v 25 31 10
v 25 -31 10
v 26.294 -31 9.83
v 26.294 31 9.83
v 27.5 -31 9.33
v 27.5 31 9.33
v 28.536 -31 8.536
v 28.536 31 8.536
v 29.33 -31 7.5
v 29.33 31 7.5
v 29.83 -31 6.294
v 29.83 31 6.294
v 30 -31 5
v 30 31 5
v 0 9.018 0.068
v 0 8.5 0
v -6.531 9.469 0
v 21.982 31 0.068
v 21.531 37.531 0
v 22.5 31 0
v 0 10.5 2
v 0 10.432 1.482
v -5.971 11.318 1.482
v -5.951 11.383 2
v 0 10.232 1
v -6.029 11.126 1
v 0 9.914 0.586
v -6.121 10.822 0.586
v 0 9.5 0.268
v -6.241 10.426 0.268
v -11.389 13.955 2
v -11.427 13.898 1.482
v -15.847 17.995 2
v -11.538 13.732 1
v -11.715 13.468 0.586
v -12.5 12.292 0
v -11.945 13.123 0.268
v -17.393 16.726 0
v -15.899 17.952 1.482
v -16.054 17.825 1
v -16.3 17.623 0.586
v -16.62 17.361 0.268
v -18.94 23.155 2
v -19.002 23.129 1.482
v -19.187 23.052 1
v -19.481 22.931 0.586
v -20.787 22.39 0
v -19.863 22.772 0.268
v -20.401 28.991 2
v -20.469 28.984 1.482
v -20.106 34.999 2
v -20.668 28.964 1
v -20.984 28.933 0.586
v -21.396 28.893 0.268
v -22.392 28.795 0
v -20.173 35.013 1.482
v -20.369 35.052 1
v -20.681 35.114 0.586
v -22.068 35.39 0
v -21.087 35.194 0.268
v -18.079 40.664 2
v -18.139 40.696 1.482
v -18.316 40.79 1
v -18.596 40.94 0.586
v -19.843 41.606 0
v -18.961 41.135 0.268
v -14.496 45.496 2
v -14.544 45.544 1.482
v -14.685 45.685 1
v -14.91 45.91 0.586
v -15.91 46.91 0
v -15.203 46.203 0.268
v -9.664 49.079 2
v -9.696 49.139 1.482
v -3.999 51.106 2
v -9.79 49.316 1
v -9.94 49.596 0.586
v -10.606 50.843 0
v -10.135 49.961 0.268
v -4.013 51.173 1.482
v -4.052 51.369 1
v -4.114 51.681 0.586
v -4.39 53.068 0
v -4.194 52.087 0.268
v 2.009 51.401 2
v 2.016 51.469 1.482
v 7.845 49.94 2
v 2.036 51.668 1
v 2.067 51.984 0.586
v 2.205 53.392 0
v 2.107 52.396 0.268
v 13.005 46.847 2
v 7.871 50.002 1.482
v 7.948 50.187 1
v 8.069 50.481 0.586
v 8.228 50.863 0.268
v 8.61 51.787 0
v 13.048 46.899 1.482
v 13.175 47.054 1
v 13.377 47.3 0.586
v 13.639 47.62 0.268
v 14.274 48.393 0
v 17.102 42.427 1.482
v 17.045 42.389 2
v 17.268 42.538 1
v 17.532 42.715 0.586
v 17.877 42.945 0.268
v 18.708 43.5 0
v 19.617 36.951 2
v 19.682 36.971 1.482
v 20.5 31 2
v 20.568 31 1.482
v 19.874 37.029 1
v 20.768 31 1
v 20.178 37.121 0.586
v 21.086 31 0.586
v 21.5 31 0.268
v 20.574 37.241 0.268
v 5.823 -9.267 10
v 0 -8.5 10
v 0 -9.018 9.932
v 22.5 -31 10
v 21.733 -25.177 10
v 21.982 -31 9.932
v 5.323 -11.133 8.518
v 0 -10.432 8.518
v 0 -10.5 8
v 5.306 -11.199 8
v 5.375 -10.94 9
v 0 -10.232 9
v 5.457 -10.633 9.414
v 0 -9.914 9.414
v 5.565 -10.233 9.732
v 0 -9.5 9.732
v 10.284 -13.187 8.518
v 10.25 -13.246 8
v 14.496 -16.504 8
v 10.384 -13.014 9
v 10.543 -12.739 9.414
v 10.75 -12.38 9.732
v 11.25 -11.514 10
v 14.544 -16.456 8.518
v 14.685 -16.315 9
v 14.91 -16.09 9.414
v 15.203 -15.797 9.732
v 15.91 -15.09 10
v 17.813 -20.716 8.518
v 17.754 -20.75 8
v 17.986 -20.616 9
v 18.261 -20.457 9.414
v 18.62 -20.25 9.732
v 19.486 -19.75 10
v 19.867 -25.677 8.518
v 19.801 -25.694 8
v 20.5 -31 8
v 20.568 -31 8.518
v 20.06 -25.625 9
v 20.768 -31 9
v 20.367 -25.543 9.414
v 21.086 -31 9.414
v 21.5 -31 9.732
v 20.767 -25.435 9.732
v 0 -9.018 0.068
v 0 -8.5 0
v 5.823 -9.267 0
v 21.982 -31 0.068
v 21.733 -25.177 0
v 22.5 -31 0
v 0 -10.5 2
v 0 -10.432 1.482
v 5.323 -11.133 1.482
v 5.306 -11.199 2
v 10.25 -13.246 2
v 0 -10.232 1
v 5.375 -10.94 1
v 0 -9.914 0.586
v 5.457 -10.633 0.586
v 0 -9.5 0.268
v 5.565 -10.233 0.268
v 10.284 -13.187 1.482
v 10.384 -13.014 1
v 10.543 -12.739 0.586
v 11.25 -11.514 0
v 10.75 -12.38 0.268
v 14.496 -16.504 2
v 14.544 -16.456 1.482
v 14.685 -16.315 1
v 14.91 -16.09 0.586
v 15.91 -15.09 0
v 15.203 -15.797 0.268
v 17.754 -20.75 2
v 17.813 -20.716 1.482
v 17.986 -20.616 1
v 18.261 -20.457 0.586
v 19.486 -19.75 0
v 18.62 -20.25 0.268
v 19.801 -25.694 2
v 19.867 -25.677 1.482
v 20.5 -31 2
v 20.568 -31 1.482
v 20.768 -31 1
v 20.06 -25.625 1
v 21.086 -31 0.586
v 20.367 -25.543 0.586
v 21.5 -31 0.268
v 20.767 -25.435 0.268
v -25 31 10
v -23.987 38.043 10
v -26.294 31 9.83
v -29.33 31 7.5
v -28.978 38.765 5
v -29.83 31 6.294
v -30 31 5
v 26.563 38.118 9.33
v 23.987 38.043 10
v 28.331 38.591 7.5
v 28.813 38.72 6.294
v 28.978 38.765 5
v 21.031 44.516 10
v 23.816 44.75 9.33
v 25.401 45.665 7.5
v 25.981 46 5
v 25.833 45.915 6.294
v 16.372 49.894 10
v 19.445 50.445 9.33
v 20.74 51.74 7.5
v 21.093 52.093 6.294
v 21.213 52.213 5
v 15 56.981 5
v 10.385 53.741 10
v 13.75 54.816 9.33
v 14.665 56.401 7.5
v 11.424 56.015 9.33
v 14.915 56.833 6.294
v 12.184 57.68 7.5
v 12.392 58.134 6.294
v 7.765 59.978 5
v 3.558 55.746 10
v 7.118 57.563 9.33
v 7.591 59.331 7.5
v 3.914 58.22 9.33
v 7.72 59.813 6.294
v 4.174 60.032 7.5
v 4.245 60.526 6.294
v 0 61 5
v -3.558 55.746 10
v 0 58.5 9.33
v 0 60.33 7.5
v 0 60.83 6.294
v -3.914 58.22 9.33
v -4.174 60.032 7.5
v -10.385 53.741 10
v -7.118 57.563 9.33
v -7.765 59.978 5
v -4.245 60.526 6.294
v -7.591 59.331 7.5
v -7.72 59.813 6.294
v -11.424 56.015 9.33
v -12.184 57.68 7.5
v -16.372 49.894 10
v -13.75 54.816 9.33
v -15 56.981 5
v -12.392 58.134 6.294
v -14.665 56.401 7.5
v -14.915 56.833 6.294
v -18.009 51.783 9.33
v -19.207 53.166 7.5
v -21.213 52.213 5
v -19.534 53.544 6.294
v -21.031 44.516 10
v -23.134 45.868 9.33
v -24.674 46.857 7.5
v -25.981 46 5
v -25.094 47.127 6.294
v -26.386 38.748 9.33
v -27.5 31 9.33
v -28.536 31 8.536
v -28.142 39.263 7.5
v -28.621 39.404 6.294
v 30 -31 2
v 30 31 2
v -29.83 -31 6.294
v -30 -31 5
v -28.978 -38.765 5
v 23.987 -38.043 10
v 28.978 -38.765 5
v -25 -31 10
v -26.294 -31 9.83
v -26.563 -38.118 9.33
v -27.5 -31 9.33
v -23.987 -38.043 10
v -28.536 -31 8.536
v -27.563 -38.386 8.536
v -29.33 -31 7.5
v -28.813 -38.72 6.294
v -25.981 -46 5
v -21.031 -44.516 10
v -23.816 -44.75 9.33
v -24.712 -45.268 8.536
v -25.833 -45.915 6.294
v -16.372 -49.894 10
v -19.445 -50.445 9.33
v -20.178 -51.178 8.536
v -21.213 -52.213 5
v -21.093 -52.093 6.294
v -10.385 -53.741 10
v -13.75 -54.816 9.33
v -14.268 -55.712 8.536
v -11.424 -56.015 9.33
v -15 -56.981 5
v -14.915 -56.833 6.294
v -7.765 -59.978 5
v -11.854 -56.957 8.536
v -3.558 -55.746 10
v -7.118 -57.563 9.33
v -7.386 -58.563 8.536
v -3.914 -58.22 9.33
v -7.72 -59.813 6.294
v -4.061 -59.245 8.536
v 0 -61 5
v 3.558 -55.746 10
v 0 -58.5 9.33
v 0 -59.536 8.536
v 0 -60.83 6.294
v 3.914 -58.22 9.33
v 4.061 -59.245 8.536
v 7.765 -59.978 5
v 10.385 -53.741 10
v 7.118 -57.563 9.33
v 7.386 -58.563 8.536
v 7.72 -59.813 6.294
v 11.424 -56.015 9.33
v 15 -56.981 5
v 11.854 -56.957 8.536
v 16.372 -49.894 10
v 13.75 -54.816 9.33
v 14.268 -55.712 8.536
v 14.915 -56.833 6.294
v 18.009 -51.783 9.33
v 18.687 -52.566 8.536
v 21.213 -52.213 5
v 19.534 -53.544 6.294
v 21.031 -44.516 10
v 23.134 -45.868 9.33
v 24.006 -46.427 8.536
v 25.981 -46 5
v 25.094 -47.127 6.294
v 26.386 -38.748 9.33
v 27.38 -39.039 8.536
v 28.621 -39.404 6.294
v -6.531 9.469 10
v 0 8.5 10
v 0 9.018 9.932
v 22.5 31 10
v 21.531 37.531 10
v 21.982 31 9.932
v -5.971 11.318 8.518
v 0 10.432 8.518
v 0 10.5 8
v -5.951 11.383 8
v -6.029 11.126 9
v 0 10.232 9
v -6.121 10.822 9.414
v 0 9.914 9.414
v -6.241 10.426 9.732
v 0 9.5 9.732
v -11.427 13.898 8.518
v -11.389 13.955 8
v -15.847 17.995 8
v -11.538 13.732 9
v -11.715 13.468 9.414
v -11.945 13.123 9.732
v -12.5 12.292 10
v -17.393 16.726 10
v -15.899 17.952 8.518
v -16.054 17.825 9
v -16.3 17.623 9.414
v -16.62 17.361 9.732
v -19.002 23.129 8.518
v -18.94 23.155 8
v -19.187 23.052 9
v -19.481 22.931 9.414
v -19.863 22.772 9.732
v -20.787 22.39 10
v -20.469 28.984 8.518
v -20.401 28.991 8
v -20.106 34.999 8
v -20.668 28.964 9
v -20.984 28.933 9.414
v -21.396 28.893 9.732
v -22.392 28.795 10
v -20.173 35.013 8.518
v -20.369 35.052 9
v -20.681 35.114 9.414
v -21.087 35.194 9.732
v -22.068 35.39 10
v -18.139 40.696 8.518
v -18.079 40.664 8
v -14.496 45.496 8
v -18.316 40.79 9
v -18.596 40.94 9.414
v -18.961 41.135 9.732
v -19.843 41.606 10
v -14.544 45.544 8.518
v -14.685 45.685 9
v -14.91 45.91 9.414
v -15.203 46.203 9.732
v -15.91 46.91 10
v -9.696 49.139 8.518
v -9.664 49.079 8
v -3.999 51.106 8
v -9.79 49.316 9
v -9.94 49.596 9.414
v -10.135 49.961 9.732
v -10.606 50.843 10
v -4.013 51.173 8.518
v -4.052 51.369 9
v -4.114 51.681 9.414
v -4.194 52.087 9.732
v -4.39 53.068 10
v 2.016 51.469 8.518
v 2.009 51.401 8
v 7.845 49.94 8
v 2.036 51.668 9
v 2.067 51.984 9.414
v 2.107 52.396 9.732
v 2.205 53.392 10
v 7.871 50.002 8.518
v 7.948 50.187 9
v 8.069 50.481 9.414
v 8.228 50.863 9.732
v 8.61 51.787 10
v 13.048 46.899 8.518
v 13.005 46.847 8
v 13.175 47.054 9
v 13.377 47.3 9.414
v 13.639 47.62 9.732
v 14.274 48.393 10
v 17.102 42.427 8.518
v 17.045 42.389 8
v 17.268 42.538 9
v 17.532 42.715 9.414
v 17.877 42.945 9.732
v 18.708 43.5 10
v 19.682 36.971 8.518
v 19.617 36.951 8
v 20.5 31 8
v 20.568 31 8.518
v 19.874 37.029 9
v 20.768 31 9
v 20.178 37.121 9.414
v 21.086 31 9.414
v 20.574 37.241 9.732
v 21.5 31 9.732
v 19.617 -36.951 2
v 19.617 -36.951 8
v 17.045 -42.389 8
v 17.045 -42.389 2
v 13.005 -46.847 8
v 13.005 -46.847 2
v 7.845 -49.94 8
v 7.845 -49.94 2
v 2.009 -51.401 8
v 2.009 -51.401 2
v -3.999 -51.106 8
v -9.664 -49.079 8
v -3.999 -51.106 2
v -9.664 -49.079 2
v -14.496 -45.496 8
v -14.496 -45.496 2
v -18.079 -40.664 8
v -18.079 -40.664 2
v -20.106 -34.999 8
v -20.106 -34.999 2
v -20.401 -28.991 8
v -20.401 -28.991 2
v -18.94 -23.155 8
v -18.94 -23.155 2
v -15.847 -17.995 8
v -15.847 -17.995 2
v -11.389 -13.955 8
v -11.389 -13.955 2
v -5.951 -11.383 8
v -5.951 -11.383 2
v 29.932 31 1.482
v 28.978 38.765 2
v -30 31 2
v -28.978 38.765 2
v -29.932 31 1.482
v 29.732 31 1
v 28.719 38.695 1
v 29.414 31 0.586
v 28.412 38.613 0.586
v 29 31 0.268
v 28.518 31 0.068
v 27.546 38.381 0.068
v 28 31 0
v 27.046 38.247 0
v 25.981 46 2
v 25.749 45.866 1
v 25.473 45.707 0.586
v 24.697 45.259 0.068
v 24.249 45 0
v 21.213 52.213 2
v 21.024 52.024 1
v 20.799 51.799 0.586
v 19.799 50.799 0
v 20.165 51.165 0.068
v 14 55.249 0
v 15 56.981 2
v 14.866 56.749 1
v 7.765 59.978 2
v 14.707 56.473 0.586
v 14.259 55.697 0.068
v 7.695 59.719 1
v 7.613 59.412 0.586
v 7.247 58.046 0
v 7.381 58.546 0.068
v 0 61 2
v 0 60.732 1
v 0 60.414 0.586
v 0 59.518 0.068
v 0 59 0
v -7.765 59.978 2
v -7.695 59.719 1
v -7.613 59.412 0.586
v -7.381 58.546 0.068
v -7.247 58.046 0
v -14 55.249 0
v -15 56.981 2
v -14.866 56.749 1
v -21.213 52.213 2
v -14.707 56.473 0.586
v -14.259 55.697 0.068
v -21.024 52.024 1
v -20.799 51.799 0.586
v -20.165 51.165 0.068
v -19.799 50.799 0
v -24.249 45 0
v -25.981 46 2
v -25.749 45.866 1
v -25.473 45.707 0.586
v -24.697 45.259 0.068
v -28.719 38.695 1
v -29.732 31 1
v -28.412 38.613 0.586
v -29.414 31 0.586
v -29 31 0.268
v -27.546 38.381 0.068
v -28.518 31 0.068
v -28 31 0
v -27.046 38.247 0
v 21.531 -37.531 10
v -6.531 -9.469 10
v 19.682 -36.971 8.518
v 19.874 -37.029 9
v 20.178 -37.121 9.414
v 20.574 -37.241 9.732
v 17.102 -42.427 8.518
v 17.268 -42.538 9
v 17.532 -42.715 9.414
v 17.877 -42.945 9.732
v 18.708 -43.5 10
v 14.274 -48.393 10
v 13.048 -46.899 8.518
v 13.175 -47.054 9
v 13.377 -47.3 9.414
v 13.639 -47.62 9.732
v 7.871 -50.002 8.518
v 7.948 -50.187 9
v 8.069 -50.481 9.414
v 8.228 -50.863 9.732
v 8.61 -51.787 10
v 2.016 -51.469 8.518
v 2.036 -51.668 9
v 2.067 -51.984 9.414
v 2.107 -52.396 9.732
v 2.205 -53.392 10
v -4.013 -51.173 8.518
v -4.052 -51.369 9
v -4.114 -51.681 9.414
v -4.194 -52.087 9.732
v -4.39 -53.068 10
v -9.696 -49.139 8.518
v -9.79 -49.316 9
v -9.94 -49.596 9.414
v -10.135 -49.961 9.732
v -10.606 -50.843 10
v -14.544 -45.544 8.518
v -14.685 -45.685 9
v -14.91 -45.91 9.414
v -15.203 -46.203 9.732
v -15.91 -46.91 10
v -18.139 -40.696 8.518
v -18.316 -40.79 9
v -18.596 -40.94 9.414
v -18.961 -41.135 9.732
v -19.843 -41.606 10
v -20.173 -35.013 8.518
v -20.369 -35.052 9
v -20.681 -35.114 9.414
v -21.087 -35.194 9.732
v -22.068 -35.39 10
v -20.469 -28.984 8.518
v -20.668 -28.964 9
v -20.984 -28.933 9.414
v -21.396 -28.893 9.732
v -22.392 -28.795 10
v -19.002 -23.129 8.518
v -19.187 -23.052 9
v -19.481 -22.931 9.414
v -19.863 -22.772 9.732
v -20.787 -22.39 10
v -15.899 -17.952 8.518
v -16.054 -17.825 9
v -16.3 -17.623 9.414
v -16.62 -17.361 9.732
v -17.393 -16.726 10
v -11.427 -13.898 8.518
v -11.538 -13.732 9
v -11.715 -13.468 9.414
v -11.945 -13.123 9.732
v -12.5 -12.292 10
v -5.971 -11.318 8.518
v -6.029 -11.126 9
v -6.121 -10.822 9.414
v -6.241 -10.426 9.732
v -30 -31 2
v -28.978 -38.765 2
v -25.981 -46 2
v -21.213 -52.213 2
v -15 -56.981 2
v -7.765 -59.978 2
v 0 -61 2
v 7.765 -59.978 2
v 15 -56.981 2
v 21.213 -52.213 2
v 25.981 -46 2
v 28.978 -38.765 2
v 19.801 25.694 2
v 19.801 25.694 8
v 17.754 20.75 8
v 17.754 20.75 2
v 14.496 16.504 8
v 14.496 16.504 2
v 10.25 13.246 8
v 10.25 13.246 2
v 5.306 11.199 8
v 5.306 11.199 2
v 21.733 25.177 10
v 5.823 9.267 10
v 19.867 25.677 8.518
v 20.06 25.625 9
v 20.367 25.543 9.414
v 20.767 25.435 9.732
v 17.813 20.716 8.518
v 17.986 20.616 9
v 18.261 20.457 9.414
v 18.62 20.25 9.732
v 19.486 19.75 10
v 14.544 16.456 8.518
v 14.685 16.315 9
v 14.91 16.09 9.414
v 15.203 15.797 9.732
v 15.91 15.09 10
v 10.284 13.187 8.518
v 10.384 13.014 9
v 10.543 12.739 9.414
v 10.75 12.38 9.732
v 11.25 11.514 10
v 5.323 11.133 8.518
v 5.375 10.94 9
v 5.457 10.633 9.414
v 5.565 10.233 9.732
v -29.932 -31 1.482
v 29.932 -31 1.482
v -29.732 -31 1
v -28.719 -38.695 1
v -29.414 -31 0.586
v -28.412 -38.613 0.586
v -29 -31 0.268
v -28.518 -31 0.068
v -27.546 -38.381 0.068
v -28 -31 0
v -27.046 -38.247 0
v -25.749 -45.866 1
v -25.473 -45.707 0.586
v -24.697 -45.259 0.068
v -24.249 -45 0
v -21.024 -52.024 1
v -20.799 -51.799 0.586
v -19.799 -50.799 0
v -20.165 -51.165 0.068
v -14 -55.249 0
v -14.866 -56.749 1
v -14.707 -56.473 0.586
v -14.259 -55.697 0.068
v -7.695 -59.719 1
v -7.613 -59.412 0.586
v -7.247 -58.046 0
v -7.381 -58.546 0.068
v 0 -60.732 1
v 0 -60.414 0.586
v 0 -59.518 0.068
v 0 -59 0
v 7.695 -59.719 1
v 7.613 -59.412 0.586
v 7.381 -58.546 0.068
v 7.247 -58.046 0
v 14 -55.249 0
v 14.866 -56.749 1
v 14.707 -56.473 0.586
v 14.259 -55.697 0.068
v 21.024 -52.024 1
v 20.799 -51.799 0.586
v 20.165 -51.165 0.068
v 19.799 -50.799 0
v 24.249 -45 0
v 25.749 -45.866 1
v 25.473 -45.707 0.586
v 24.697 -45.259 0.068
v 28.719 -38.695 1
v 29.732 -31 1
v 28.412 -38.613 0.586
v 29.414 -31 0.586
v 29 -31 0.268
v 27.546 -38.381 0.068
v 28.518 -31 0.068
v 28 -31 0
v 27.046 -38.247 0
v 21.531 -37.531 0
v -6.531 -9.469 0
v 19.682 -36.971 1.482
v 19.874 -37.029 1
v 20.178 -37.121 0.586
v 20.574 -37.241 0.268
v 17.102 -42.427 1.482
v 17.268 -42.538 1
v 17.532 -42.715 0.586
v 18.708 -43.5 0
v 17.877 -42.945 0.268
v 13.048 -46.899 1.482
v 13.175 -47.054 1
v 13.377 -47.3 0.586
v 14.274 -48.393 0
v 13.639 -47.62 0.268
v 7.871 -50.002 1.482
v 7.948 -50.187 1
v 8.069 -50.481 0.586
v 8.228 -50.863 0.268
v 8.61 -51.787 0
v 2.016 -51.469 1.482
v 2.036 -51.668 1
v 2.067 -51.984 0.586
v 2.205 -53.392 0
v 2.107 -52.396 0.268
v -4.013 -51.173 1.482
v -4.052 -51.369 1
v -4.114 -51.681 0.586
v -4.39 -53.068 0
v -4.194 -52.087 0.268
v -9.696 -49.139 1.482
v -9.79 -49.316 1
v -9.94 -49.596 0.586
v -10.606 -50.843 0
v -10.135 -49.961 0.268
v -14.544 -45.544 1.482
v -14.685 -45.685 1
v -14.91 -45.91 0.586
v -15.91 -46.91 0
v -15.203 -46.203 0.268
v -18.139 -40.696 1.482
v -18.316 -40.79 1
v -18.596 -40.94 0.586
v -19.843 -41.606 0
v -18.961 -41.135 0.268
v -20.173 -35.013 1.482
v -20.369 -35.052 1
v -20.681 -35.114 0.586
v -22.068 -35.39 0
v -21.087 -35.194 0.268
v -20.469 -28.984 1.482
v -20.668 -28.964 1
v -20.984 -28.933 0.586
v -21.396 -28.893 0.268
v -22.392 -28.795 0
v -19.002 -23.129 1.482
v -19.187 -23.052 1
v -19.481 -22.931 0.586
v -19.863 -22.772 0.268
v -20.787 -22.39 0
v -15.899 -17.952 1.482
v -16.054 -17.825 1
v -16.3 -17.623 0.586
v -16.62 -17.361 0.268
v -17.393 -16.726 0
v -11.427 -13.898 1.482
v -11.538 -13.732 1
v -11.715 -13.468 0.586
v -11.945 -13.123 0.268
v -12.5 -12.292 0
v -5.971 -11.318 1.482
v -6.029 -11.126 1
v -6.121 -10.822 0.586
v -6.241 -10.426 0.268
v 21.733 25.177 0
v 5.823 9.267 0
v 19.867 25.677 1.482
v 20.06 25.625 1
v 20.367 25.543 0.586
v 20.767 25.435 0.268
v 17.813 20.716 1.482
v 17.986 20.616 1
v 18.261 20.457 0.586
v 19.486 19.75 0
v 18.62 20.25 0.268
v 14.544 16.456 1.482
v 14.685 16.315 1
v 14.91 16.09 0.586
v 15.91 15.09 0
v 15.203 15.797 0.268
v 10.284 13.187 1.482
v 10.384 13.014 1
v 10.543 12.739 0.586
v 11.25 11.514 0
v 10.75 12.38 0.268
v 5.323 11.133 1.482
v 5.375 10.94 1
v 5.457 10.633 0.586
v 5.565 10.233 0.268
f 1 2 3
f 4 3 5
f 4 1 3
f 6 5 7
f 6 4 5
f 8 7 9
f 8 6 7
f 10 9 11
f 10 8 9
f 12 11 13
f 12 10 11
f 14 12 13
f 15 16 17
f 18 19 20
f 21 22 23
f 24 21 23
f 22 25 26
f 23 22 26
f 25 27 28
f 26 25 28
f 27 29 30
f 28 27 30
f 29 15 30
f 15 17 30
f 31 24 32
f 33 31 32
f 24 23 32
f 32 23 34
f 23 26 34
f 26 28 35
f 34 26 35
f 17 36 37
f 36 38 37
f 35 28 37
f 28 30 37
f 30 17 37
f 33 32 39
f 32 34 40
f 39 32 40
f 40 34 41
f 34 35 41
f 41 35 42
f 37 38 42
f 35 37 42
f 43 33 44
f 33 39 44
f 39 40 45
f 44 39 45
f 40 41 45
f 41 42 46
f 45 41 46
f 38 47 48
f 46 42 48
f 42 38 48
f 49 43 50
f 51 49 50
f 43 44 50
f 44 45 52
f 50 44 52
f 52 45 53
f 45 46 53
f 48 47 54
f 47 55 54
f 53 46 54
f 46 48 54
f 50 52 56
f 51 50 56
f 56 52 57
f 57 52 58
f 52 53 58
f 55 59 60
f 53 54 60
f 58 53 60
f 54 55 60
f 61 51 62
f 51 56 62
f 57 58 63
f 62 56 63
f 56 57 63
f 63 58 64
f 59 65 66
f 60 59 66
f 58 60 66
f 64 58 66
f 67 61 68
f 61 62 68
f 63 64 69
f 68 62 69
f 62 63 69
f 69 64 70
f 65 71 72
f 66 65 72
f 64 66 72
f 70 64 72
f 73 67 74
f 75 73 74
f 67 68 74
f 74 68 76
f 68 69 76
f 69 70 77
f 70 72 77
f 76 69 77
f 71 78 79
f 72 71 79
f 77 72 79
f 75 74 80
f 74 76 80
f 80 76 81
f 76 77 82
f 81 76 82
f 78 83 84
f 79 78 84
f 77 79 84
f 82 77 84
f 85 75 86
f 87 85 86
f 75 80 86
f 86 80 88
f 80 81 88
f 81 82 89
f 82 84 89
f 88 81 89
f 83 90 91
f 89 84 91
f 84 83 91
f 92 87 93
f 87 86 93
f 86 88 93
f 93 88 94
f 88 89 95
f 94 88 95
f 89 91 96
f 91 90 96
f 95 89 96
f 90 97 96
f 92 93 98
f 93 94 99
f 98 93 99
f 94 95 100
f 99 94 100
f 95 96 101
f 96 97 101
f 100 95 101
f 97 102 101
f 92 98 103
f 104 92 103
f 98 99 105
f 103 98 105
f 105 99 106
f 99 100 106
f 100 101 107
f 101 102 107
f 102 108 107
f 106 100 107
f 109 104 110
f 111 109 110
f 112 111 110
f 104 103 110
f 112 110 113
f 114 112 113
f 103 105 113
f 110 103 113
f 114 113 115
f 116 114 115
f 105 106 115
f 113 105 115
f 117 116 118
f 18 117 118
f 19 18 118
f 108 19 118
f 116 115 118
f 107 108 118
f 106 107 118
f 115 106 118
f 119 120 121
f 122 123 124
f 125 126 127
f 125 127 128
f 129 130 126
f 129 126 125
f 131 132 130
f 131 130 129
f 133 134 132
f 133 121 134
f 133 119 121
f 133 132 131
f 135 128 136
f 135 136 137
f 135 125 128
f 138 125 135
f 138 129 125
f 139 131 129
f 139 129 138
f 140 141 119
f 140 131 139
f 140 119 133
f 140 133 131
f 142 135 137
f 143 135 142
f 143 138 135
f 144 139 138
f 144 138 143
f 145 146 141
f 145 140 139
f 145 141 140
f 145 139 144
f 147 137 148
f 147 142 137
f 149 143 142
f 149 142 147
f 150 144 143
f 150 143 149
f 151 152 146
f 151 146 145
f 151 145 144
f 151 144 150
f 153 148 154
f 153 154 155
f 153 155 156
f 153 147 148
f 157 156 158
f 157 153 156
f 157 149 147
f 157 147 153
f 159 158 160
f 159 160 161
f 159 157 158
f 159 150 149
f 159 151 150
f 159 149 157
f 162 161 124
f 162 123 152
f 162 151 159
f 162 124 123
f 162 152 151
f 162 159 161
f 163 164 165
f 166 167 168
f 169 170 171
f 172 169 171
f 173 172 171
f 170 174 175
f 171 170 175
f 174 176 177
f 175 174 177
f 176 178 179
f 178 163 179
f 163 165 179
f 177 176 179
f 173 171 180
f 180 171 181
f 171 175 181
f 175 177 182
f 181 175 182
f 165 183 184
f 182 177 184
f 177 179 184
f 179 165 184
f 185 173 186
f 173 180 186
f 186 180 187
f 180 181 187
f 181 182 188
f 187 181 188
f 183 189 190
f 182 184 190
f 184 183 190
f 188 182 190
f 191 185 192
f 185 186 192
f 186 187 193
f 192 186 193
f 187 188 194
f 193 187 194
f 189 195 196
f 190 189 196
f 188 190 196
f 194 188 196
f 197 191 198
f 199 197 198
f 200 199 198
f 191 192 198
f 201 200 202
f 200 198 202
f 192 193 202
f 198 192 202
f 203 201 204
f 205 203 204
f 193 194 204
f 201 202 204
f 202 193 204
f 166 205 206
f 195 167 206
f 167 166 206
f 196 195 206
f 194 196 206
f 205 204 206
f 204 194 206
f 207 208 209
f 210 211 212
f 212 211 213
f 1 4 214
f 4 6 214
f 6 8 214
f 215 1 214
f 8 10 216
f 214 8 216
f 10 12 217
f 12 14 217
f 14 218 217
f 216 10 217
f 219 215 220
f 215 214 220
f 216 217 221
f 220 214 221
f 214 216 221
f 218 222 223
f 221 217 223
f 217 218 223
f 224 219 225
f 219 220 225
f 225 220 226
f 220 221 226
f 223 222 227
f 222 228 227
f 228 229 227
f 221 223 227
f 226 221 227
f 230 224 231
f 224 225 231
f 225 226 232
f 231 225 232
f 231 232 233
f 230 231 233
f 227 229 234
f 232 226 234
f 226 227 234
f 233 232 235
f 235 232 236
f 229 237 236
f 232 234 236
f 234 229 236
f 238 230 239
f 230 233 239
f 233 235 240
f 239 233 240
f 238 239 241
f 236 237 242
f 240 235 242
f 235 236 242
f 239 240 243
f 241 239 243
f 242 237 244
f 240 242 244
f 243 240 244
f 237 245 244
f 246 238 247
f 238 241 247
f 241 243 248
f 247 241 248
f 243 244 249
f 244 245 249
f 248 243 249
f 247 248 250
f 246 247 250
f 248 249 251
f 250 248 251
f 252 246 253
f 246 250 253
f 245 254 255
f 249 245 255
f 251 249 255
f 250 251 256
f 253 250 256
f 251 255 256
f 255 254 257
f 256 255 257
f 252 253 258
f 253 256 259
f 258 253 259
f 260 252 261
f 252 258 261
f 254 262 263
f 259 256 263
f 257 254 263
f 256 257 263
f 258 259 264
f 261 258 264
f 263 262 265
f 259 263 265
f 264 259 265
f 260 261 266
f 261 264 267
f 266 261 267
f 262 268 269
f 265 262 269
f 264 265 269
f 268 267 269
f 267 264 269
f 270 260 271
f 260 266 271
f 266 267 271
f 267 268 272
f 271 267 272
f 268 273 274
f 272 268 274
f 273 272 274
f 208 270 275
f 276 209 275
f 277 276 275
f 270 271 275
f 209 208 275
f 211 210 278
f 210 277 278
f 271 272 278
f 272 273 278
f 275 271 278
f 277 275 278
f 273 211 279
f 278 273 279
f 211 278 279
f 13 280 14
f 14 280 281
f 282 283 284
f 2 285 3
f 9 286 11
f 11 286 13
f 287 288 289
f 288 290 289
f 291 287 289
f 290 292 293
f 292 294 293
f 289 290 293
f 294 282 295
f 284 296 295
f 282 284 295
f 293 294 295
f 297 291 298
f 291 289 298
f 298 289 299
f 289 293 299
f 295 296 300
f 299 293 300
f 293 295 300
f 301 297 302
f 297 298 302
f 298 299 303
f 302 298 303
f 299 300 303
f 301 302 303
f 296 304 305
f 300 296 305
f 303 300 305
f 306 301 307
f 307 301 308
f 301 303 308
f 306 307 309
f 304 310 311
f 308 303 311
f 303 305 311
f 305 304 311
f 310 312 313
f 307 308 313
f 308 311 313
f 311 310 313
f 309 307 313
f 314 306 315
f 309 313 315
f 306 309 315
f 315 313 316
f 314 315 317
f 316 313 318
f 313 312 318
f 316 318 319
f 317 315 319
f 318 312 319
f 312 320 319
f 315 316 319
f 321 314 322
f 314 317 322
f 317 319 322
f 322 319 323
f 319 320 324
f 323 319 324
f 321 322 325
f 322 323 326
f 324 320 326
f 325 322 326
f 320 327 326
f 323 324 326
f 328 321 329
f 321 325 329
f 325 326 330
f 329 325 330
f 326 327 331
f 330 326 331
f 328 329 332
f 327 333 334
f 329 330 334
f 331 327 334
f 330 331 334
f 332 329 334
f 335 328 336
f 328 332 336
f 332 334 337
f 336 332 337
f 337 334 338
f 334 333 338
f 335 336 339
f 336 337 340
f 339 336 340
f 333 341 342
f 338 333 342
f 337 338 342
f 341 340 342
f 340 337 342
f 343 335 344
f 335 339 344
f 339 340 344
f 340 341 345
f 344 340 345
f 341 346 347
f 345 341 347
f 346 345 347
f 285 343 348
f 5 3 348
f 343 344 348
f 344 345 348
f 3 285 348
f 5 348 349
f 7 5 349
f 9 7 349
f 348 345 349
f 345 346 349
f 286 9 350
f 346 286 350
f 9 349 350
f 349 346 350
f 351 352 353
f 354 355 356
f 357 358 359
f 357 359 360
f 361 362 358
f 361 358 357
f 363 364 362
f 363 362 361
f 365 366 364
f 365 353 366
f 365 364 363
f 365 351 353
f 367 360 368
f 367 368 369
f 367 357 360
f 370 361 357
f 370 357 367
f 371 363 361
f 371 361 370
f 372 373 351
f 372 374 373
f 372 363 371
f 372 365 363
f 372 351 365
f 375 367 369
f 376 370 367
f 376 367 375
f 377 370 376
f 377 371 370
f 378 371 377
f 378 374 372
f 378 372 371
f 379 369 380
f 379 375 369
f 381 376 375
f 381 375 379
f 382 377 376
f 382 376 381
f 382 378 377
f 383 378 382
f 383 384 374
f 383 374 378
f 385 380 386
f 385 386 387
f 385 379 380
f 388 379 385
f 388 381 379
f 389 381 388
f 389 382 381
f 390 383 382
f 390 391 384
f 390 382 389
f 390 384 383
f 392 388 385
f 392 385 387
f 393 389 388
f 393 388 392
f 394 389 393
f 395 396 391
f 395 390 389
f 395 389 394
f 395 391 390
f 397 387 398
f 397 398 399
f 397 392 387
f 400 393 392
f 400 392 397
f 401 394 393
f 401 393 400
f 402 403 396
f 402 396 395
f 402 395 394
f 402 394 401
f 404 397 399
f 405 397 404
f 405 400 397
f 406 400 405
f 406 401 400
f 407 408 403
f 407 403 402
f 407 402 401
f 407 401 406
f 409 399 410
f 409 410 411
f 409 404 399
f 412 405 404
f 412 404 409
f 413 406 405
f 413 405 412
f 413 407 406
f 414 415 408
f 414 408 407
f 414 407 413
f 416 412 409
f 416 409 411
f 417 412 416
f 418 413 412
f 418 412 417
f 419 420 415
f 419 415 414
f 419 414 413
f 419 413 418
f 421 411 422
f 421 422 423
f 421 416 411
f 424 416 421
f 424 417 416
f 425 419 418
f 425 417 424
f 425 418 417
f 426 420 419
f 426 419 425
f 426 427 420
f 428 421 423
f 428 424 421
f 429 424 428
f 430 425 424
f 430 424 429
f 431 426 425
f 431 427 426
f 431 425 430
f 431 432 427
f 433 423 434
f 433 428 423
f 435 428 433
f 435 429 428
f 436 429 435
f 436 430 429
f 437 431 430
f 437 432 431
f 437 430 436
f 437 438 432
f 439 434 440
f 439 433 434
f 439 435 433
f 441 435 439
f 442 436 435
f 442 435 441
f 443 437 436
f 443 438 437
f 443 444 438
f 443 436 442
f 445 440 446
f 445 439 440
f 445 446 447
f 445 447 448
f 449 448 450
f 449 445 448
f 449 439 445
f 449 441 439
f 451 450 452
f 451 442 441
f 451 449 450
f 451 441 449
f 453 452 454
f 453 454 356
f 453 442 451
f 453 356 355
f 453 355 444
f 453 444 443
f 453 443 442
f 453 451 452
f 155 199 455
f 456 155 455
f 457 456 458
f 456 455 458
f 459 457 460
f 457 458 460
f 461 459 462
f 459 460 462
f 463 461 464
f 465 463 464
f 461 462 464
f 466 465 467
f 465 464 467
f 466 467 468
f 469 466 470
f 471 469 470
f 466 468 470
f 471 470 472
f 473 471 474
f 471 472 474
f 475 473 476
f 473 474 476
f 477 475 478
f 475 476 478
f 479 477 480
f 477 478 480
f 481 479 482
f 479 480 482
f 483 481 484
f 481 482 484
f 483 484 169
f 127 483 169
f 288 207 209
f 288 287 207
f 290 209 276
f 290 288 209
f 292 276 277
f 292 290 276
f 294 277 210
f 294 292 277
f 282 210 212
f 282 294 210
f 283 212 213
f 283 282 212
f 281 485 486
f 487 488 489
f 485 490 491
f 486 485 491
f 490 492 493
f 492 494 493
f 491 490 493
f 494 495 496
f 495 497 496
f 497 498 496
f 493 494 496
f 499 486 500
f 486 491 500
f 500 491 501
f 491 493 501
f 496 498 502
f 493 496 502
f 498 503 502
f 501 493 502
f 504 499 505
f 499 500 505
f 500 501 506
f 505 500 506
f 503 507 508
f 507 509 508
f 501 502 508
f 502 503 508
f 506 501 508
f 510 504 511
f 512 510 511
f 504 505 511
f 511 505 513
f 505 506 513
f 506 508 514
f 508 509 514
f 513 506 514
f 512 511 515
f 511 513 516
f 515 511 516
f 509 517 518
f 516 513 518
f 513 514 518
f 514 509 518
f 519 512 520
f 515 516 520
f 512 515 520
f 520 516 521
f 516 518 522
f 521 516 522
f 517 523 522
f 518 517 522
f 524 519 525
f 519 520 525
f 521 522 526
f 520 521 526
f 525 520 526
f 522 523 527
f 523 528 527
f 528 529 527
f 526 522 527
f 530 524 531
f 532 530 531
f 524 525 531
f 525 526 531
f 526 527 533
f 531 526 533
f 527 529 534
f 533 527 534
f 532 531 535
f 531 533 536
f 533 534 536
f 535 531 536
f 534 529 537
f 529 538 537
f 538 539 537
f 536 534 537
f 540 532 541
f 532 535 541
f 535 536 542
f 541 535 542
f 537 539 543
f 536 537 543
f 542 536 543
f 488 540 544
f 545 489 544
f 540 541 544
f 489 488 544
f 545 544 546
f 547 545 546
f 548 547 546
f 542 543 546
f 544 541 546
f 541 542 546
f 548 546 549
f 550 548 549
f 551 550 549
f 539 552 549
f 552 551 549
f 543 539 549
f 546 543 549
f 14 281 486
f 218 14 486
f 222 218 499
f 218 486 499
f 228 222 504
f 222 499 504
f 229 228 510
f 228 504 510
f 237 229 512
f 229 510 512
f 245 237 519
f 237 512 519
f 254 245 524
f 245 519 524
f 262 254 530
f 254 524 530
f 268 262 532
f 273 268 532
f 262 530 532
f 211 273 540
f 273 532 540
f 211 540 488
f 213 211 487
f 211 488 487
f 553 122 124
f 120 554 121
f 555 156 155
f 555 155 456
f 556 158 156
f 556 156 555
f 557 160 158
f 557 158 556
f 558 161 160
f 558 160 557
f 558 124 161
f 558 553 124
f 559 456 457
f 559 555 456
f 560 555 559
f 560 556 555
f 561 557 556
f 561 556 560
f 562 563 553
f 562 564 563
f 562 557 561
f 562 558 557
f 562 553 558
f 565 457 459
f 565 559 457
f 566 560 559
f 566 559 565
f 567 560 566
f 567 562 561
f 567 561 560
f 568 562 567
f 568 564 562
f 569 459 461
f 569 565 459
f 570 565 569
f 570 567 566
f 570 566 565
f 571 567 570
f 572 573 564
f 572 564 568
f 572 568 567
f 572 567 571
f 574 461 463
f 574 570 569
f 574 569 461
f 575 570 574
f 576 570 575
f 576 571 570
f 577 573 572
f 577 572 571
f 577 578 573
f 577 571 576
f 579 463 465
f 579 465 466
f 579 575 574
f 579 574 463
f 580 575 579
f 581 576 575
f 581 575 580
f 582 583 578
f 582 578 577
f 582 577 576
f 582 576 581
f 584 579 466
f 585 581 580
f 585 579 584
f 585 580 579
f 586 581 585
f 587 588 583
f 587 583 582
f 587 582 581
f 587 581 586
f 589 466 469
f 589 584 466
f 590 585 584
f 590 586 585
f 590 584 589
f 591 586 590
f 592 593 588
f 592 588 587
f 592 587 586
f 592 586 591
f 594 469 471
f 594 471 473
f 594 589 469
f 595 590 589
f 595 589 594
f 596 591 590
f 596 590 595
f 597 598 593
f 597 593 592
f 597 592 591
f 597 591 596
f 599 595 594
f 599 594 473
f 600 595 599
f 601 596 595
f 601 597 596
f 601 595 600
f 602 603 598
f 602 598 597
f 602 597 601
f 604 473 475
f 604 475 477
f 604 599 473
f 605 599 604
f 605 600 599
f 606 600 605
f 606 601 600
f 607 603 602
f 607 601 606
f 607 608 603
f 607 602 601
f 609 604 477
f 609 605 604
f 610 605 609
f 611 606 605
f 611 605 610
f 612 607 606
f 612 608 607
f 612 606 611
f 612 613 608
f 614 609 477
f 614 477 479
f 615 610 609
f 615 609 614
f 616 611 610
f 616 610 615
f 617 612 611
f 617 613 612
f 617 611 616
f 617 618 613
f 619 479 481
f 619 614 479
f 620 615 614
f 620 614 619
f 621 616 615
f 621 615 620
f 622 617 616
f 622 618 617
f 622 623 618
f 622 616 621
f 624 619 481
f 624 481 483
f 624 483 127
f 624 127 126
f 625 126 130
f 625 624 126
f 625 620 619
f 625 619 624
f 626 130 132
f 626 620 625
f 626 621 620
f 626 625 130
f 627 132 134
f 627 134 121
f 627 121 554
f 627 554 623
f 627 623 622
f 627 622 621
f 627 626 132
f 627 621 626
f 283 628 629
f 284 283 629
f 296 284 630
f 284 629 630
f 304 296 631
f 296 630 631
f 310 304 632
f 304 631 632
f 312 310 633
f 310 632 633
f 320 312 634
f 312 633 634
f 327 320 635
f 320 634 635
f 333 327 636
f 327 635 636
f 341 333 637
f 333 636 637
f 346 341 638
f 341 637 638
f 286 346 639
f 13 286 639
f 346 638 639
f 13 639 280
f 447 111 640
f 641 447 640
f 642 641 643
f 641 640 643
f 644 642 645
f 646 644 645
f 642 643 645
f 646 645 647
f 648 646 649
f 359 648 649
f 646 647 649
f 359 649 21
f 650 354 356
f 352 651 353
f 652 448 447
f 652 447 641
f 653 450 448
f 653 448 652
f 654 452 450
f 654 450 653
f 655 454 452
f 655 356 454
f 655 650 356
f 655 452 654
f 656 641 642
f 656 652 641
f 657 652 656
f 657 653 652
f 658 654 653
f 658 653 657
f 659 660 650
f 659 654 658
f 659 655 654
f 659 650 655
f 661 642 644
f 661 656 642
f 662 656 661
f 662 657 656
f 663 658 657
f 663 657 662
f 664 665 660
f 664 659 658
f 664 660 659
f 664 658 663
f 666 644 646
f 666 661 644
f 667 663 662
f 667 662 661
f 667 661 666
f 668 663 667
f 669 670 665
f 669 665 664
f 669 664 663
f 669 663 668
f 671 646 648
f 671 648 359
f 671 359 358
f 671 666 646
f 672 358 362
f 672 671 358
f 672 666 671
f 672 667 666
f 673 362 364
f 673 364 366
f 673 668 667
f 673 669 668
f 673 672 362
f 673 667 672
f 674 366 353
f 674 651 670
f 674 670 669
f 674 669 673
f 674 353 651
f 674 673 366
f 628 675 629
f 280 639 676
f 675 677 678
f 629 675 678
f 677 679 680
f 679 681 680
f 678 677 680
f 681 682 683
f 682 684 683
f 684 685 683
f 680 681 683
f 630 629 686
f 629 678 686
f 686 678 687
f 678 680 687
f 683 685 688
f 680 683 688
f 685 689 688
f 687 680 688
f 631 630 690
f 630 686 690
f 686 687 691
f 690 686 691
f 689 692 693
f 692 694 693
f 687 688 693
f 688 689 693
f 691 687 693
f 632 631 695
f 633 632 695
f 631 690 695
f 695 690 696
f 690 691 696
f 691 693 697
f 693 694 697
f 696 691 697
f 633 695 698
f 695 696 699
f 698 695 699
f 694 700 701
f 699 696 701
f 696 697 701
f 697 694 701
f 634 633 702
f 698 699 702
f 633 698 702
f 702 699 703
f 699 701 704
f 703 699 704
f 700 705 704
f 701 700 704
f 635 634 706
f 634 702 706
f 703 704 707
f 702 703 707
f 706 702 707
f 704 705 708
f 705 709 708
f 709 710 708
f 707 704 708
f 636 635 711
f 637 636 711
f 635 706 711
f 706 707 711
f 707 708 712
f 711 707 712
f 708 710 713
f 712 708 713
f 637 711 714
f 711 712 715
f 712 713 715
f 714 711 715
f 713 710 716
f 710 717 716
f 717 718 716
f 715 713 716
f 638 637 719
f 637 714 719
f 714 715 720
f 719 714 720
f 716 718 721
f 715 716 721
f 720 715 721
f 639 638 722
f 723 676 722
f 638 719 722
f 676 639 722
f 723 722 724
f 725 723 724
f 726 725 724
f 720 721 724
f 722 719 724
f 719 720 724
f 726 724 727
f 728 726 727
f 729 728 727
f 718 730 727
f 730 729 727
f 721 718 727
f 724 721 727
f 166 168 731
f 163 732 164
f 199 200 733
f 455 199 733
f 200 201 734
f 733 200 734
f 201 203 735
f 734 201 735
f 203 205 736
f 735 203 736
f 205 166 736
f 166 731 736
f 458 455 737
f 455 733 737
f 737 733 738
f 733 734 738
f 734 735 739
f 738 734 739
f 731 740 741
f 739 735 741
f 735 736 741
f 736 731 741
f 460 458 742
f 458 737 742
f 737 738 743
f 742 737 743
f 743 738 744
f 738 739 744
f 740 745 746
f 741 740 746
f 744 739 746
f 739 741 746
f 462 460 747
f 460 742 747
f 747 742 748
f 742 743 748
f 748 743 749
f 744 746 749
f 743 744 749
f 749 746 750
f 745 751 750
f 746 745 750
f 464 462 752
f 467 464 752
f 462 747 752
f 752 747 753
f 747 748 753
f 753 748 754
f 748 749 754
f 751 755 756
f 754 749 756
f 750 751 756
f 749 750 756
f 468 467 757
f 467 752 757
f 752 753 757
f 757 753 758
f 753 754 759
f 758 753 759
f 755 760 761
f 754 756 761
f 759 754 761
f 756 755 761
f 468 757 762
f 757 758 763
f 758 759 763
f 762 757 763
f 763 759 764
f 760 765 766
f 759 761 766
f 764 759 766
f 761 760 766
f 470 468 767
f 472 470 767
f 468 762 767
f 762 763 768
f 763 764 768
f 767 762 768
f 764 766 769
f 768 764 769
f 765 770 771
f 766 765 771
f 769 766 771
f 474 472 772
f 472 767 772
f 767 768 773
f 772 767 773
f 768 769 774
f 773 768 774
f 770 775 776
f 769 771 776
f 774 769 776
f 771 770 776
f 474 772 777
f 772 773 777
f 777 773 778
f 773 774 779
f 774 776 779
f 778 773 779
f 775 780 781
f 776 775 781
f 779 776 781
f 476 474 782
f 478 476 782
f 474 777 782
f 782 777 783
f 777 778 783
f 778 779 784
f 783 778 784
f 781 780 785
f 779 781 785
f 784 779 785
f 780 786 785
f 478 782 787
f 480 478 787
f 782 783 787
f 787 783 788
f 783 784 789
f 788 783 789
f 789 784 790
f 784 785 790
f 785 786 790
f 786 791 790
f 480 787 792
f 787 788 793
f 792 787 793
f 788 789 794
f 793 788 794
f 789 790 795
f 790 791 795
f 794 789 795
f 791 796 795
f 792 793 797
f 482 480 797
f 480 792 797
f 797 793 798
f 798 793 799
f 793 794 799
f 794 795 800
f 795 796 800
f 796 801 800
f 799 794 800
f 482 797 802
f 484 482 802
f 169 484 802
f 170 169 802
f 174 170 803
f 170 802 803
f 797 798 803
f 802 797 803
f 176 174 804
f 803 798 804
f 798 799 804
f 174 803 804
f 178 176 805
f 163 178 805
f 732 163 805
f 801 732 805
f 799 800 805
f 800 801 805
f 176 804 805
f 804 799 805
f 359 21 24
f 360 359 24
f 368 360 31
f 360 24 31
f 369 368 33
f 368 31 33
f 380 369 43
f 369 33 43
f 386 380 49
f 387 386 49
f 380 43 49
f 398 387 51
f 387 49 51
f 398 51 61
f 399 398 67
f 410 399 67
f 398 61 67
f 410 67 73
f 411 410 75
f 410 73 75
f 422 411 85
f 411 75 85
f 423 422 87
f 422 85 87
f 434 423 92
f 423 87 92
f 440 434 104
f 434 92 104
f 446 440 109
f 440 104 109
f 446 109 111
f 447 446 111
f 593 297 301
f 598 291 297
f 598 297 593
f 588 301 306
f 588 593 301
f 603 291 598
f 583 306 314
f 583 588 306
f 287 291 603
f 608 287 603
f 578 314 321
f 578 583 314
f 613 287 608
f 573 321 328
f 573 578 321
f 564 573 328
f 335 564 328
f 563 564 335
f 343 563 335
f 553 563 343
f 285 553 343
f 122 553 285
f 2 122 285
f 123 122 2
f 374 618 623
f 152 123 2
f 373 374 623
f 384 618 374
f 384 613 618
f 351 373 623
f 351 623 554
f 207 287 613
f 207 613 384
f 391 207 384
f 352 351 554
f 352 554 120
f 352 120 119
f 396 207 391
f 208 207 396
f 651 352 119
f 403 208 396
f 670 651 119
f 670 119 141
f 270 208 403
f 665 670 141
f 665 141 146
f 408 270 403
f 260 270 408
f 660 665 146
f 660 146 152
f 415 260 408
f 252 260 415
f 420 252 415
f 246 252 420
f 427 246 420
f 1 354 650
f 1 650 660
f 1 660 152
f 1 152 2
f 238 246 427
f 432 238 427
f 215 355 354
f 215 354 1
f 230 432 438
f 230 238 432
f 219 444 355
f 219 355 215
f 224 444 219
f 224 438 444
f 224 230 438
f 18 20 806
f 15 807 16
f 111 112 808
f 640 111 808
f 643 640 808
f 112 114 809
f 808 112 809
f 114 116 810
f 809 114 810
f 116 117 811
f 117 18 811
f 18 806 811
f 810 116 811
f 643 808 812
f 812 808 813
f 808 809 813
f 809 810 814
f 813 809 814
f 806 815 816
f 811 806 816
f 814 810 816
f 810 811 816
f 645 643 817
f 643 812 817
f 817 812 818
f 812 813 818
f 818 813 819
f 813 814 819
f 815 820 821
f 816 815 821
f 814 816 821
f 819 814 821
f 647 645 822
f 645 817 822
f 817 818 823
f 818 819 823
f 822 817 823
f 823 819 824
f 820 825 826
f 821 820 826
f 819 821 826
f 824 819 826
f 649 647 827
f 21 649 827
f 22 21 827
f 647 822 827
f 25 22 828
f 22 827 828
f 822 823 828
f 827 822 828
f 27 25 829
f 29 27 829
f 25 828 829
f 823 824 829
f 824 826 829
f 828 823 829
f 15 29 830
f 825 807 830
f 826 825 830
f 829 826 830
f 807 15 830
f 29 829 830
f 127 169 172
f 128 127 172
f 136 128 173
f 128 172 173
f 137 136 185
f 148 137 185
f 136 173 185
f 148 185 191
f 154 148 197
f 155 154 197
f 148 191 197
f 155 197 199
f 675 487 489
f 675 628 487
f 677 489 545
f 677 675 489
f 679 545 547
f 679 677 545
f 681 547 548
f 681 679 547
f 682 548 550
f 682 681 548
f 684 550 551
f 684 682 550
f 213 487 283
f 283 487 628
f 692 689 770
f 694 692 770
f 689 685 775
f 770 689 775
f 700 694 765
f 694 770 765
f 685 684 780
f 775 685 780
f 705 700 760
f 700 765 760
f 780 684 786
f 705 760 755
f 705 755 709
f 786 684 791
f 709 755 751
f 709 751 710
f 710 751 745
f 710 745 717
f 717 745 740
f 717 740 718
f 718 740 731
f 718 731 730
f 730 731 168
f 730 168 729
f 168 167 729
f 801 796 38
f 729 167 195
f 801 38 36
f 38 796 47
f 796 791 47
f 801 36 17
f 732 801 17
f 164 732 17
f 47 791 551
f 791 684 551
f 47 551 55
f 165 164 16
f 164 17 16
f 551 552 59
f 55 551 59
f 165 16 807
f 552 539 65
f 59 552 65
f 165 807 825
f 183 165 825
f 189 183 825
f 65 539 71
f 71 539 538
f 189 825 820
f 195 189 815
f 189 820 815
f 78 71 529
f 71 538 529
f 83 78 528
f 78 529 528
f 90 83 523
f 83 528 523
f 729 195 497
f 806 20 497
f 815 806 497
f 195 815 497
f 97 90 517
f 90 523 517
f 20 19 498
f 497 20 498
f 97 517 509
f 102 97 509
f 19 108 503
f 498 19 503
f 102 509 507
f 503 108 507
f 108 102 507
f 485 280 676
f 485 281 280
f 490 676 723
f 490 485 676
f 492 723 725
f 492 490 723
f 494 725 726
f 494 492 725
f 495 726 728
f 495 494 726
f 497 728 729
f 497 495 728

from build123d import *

# Parameters (mm, degrees)
F1_DEPTH = 10
F2_R     = 2
F3_R     = 5


with BuildPart() as f1:
    # F0 (on Top) → F1 (new body)
    with BuildSketch(Plane.XY):
        with BuildLine():
            ThreePointArc((30, 31), (0, 61), (-30, 31))
            Line((-30, 31), (-30, -31))
            ThreePointArc((-30, -31), (0, -61), (30, -31))
            Line((30, -31), (30, 31))
        make_face()
        with BuildLine():
            ThreePointArc((20.5, -31), (-14.4956890143, -45.4956890143), (0, -10.5))
            ThreePointArc((0, -10.5), (14.4956890143, -16.5043109857), (20.5, -31))
        make_face(mode=Mode.SUBTRACT)
        with BuildLine():
            ThreePointArc((20.5, 31), (14.4956890143, 16.5043109857), (0, 10.5))
            ThreePointArc((0, 10.5), (-14.4956890143, 45.4956890143), (20.5, 31))
        make_face(mode=Mode.SUBTRACT)
    extrude(amount=F1_DEPTH)

    # F2
    f2_edges = [f1.edges().sort_by_distance(p)[0] for p in [
        (-20.5, 31, 10),
        (-20.5, 31, 0),
        (0, -51.5, 10),
        (0, -51.5, 0),
        (30, 0, 0),
    ]]
    fillet(f2_edges, radius=F2_R)

    # F3
    f3_edges = [f1.edges().sort_by_distance(p)[0] for p in [
        (-30, 0, 10),
    ]]
    fillet(f3_edges, radius=F3_R)


solid = f1.part
